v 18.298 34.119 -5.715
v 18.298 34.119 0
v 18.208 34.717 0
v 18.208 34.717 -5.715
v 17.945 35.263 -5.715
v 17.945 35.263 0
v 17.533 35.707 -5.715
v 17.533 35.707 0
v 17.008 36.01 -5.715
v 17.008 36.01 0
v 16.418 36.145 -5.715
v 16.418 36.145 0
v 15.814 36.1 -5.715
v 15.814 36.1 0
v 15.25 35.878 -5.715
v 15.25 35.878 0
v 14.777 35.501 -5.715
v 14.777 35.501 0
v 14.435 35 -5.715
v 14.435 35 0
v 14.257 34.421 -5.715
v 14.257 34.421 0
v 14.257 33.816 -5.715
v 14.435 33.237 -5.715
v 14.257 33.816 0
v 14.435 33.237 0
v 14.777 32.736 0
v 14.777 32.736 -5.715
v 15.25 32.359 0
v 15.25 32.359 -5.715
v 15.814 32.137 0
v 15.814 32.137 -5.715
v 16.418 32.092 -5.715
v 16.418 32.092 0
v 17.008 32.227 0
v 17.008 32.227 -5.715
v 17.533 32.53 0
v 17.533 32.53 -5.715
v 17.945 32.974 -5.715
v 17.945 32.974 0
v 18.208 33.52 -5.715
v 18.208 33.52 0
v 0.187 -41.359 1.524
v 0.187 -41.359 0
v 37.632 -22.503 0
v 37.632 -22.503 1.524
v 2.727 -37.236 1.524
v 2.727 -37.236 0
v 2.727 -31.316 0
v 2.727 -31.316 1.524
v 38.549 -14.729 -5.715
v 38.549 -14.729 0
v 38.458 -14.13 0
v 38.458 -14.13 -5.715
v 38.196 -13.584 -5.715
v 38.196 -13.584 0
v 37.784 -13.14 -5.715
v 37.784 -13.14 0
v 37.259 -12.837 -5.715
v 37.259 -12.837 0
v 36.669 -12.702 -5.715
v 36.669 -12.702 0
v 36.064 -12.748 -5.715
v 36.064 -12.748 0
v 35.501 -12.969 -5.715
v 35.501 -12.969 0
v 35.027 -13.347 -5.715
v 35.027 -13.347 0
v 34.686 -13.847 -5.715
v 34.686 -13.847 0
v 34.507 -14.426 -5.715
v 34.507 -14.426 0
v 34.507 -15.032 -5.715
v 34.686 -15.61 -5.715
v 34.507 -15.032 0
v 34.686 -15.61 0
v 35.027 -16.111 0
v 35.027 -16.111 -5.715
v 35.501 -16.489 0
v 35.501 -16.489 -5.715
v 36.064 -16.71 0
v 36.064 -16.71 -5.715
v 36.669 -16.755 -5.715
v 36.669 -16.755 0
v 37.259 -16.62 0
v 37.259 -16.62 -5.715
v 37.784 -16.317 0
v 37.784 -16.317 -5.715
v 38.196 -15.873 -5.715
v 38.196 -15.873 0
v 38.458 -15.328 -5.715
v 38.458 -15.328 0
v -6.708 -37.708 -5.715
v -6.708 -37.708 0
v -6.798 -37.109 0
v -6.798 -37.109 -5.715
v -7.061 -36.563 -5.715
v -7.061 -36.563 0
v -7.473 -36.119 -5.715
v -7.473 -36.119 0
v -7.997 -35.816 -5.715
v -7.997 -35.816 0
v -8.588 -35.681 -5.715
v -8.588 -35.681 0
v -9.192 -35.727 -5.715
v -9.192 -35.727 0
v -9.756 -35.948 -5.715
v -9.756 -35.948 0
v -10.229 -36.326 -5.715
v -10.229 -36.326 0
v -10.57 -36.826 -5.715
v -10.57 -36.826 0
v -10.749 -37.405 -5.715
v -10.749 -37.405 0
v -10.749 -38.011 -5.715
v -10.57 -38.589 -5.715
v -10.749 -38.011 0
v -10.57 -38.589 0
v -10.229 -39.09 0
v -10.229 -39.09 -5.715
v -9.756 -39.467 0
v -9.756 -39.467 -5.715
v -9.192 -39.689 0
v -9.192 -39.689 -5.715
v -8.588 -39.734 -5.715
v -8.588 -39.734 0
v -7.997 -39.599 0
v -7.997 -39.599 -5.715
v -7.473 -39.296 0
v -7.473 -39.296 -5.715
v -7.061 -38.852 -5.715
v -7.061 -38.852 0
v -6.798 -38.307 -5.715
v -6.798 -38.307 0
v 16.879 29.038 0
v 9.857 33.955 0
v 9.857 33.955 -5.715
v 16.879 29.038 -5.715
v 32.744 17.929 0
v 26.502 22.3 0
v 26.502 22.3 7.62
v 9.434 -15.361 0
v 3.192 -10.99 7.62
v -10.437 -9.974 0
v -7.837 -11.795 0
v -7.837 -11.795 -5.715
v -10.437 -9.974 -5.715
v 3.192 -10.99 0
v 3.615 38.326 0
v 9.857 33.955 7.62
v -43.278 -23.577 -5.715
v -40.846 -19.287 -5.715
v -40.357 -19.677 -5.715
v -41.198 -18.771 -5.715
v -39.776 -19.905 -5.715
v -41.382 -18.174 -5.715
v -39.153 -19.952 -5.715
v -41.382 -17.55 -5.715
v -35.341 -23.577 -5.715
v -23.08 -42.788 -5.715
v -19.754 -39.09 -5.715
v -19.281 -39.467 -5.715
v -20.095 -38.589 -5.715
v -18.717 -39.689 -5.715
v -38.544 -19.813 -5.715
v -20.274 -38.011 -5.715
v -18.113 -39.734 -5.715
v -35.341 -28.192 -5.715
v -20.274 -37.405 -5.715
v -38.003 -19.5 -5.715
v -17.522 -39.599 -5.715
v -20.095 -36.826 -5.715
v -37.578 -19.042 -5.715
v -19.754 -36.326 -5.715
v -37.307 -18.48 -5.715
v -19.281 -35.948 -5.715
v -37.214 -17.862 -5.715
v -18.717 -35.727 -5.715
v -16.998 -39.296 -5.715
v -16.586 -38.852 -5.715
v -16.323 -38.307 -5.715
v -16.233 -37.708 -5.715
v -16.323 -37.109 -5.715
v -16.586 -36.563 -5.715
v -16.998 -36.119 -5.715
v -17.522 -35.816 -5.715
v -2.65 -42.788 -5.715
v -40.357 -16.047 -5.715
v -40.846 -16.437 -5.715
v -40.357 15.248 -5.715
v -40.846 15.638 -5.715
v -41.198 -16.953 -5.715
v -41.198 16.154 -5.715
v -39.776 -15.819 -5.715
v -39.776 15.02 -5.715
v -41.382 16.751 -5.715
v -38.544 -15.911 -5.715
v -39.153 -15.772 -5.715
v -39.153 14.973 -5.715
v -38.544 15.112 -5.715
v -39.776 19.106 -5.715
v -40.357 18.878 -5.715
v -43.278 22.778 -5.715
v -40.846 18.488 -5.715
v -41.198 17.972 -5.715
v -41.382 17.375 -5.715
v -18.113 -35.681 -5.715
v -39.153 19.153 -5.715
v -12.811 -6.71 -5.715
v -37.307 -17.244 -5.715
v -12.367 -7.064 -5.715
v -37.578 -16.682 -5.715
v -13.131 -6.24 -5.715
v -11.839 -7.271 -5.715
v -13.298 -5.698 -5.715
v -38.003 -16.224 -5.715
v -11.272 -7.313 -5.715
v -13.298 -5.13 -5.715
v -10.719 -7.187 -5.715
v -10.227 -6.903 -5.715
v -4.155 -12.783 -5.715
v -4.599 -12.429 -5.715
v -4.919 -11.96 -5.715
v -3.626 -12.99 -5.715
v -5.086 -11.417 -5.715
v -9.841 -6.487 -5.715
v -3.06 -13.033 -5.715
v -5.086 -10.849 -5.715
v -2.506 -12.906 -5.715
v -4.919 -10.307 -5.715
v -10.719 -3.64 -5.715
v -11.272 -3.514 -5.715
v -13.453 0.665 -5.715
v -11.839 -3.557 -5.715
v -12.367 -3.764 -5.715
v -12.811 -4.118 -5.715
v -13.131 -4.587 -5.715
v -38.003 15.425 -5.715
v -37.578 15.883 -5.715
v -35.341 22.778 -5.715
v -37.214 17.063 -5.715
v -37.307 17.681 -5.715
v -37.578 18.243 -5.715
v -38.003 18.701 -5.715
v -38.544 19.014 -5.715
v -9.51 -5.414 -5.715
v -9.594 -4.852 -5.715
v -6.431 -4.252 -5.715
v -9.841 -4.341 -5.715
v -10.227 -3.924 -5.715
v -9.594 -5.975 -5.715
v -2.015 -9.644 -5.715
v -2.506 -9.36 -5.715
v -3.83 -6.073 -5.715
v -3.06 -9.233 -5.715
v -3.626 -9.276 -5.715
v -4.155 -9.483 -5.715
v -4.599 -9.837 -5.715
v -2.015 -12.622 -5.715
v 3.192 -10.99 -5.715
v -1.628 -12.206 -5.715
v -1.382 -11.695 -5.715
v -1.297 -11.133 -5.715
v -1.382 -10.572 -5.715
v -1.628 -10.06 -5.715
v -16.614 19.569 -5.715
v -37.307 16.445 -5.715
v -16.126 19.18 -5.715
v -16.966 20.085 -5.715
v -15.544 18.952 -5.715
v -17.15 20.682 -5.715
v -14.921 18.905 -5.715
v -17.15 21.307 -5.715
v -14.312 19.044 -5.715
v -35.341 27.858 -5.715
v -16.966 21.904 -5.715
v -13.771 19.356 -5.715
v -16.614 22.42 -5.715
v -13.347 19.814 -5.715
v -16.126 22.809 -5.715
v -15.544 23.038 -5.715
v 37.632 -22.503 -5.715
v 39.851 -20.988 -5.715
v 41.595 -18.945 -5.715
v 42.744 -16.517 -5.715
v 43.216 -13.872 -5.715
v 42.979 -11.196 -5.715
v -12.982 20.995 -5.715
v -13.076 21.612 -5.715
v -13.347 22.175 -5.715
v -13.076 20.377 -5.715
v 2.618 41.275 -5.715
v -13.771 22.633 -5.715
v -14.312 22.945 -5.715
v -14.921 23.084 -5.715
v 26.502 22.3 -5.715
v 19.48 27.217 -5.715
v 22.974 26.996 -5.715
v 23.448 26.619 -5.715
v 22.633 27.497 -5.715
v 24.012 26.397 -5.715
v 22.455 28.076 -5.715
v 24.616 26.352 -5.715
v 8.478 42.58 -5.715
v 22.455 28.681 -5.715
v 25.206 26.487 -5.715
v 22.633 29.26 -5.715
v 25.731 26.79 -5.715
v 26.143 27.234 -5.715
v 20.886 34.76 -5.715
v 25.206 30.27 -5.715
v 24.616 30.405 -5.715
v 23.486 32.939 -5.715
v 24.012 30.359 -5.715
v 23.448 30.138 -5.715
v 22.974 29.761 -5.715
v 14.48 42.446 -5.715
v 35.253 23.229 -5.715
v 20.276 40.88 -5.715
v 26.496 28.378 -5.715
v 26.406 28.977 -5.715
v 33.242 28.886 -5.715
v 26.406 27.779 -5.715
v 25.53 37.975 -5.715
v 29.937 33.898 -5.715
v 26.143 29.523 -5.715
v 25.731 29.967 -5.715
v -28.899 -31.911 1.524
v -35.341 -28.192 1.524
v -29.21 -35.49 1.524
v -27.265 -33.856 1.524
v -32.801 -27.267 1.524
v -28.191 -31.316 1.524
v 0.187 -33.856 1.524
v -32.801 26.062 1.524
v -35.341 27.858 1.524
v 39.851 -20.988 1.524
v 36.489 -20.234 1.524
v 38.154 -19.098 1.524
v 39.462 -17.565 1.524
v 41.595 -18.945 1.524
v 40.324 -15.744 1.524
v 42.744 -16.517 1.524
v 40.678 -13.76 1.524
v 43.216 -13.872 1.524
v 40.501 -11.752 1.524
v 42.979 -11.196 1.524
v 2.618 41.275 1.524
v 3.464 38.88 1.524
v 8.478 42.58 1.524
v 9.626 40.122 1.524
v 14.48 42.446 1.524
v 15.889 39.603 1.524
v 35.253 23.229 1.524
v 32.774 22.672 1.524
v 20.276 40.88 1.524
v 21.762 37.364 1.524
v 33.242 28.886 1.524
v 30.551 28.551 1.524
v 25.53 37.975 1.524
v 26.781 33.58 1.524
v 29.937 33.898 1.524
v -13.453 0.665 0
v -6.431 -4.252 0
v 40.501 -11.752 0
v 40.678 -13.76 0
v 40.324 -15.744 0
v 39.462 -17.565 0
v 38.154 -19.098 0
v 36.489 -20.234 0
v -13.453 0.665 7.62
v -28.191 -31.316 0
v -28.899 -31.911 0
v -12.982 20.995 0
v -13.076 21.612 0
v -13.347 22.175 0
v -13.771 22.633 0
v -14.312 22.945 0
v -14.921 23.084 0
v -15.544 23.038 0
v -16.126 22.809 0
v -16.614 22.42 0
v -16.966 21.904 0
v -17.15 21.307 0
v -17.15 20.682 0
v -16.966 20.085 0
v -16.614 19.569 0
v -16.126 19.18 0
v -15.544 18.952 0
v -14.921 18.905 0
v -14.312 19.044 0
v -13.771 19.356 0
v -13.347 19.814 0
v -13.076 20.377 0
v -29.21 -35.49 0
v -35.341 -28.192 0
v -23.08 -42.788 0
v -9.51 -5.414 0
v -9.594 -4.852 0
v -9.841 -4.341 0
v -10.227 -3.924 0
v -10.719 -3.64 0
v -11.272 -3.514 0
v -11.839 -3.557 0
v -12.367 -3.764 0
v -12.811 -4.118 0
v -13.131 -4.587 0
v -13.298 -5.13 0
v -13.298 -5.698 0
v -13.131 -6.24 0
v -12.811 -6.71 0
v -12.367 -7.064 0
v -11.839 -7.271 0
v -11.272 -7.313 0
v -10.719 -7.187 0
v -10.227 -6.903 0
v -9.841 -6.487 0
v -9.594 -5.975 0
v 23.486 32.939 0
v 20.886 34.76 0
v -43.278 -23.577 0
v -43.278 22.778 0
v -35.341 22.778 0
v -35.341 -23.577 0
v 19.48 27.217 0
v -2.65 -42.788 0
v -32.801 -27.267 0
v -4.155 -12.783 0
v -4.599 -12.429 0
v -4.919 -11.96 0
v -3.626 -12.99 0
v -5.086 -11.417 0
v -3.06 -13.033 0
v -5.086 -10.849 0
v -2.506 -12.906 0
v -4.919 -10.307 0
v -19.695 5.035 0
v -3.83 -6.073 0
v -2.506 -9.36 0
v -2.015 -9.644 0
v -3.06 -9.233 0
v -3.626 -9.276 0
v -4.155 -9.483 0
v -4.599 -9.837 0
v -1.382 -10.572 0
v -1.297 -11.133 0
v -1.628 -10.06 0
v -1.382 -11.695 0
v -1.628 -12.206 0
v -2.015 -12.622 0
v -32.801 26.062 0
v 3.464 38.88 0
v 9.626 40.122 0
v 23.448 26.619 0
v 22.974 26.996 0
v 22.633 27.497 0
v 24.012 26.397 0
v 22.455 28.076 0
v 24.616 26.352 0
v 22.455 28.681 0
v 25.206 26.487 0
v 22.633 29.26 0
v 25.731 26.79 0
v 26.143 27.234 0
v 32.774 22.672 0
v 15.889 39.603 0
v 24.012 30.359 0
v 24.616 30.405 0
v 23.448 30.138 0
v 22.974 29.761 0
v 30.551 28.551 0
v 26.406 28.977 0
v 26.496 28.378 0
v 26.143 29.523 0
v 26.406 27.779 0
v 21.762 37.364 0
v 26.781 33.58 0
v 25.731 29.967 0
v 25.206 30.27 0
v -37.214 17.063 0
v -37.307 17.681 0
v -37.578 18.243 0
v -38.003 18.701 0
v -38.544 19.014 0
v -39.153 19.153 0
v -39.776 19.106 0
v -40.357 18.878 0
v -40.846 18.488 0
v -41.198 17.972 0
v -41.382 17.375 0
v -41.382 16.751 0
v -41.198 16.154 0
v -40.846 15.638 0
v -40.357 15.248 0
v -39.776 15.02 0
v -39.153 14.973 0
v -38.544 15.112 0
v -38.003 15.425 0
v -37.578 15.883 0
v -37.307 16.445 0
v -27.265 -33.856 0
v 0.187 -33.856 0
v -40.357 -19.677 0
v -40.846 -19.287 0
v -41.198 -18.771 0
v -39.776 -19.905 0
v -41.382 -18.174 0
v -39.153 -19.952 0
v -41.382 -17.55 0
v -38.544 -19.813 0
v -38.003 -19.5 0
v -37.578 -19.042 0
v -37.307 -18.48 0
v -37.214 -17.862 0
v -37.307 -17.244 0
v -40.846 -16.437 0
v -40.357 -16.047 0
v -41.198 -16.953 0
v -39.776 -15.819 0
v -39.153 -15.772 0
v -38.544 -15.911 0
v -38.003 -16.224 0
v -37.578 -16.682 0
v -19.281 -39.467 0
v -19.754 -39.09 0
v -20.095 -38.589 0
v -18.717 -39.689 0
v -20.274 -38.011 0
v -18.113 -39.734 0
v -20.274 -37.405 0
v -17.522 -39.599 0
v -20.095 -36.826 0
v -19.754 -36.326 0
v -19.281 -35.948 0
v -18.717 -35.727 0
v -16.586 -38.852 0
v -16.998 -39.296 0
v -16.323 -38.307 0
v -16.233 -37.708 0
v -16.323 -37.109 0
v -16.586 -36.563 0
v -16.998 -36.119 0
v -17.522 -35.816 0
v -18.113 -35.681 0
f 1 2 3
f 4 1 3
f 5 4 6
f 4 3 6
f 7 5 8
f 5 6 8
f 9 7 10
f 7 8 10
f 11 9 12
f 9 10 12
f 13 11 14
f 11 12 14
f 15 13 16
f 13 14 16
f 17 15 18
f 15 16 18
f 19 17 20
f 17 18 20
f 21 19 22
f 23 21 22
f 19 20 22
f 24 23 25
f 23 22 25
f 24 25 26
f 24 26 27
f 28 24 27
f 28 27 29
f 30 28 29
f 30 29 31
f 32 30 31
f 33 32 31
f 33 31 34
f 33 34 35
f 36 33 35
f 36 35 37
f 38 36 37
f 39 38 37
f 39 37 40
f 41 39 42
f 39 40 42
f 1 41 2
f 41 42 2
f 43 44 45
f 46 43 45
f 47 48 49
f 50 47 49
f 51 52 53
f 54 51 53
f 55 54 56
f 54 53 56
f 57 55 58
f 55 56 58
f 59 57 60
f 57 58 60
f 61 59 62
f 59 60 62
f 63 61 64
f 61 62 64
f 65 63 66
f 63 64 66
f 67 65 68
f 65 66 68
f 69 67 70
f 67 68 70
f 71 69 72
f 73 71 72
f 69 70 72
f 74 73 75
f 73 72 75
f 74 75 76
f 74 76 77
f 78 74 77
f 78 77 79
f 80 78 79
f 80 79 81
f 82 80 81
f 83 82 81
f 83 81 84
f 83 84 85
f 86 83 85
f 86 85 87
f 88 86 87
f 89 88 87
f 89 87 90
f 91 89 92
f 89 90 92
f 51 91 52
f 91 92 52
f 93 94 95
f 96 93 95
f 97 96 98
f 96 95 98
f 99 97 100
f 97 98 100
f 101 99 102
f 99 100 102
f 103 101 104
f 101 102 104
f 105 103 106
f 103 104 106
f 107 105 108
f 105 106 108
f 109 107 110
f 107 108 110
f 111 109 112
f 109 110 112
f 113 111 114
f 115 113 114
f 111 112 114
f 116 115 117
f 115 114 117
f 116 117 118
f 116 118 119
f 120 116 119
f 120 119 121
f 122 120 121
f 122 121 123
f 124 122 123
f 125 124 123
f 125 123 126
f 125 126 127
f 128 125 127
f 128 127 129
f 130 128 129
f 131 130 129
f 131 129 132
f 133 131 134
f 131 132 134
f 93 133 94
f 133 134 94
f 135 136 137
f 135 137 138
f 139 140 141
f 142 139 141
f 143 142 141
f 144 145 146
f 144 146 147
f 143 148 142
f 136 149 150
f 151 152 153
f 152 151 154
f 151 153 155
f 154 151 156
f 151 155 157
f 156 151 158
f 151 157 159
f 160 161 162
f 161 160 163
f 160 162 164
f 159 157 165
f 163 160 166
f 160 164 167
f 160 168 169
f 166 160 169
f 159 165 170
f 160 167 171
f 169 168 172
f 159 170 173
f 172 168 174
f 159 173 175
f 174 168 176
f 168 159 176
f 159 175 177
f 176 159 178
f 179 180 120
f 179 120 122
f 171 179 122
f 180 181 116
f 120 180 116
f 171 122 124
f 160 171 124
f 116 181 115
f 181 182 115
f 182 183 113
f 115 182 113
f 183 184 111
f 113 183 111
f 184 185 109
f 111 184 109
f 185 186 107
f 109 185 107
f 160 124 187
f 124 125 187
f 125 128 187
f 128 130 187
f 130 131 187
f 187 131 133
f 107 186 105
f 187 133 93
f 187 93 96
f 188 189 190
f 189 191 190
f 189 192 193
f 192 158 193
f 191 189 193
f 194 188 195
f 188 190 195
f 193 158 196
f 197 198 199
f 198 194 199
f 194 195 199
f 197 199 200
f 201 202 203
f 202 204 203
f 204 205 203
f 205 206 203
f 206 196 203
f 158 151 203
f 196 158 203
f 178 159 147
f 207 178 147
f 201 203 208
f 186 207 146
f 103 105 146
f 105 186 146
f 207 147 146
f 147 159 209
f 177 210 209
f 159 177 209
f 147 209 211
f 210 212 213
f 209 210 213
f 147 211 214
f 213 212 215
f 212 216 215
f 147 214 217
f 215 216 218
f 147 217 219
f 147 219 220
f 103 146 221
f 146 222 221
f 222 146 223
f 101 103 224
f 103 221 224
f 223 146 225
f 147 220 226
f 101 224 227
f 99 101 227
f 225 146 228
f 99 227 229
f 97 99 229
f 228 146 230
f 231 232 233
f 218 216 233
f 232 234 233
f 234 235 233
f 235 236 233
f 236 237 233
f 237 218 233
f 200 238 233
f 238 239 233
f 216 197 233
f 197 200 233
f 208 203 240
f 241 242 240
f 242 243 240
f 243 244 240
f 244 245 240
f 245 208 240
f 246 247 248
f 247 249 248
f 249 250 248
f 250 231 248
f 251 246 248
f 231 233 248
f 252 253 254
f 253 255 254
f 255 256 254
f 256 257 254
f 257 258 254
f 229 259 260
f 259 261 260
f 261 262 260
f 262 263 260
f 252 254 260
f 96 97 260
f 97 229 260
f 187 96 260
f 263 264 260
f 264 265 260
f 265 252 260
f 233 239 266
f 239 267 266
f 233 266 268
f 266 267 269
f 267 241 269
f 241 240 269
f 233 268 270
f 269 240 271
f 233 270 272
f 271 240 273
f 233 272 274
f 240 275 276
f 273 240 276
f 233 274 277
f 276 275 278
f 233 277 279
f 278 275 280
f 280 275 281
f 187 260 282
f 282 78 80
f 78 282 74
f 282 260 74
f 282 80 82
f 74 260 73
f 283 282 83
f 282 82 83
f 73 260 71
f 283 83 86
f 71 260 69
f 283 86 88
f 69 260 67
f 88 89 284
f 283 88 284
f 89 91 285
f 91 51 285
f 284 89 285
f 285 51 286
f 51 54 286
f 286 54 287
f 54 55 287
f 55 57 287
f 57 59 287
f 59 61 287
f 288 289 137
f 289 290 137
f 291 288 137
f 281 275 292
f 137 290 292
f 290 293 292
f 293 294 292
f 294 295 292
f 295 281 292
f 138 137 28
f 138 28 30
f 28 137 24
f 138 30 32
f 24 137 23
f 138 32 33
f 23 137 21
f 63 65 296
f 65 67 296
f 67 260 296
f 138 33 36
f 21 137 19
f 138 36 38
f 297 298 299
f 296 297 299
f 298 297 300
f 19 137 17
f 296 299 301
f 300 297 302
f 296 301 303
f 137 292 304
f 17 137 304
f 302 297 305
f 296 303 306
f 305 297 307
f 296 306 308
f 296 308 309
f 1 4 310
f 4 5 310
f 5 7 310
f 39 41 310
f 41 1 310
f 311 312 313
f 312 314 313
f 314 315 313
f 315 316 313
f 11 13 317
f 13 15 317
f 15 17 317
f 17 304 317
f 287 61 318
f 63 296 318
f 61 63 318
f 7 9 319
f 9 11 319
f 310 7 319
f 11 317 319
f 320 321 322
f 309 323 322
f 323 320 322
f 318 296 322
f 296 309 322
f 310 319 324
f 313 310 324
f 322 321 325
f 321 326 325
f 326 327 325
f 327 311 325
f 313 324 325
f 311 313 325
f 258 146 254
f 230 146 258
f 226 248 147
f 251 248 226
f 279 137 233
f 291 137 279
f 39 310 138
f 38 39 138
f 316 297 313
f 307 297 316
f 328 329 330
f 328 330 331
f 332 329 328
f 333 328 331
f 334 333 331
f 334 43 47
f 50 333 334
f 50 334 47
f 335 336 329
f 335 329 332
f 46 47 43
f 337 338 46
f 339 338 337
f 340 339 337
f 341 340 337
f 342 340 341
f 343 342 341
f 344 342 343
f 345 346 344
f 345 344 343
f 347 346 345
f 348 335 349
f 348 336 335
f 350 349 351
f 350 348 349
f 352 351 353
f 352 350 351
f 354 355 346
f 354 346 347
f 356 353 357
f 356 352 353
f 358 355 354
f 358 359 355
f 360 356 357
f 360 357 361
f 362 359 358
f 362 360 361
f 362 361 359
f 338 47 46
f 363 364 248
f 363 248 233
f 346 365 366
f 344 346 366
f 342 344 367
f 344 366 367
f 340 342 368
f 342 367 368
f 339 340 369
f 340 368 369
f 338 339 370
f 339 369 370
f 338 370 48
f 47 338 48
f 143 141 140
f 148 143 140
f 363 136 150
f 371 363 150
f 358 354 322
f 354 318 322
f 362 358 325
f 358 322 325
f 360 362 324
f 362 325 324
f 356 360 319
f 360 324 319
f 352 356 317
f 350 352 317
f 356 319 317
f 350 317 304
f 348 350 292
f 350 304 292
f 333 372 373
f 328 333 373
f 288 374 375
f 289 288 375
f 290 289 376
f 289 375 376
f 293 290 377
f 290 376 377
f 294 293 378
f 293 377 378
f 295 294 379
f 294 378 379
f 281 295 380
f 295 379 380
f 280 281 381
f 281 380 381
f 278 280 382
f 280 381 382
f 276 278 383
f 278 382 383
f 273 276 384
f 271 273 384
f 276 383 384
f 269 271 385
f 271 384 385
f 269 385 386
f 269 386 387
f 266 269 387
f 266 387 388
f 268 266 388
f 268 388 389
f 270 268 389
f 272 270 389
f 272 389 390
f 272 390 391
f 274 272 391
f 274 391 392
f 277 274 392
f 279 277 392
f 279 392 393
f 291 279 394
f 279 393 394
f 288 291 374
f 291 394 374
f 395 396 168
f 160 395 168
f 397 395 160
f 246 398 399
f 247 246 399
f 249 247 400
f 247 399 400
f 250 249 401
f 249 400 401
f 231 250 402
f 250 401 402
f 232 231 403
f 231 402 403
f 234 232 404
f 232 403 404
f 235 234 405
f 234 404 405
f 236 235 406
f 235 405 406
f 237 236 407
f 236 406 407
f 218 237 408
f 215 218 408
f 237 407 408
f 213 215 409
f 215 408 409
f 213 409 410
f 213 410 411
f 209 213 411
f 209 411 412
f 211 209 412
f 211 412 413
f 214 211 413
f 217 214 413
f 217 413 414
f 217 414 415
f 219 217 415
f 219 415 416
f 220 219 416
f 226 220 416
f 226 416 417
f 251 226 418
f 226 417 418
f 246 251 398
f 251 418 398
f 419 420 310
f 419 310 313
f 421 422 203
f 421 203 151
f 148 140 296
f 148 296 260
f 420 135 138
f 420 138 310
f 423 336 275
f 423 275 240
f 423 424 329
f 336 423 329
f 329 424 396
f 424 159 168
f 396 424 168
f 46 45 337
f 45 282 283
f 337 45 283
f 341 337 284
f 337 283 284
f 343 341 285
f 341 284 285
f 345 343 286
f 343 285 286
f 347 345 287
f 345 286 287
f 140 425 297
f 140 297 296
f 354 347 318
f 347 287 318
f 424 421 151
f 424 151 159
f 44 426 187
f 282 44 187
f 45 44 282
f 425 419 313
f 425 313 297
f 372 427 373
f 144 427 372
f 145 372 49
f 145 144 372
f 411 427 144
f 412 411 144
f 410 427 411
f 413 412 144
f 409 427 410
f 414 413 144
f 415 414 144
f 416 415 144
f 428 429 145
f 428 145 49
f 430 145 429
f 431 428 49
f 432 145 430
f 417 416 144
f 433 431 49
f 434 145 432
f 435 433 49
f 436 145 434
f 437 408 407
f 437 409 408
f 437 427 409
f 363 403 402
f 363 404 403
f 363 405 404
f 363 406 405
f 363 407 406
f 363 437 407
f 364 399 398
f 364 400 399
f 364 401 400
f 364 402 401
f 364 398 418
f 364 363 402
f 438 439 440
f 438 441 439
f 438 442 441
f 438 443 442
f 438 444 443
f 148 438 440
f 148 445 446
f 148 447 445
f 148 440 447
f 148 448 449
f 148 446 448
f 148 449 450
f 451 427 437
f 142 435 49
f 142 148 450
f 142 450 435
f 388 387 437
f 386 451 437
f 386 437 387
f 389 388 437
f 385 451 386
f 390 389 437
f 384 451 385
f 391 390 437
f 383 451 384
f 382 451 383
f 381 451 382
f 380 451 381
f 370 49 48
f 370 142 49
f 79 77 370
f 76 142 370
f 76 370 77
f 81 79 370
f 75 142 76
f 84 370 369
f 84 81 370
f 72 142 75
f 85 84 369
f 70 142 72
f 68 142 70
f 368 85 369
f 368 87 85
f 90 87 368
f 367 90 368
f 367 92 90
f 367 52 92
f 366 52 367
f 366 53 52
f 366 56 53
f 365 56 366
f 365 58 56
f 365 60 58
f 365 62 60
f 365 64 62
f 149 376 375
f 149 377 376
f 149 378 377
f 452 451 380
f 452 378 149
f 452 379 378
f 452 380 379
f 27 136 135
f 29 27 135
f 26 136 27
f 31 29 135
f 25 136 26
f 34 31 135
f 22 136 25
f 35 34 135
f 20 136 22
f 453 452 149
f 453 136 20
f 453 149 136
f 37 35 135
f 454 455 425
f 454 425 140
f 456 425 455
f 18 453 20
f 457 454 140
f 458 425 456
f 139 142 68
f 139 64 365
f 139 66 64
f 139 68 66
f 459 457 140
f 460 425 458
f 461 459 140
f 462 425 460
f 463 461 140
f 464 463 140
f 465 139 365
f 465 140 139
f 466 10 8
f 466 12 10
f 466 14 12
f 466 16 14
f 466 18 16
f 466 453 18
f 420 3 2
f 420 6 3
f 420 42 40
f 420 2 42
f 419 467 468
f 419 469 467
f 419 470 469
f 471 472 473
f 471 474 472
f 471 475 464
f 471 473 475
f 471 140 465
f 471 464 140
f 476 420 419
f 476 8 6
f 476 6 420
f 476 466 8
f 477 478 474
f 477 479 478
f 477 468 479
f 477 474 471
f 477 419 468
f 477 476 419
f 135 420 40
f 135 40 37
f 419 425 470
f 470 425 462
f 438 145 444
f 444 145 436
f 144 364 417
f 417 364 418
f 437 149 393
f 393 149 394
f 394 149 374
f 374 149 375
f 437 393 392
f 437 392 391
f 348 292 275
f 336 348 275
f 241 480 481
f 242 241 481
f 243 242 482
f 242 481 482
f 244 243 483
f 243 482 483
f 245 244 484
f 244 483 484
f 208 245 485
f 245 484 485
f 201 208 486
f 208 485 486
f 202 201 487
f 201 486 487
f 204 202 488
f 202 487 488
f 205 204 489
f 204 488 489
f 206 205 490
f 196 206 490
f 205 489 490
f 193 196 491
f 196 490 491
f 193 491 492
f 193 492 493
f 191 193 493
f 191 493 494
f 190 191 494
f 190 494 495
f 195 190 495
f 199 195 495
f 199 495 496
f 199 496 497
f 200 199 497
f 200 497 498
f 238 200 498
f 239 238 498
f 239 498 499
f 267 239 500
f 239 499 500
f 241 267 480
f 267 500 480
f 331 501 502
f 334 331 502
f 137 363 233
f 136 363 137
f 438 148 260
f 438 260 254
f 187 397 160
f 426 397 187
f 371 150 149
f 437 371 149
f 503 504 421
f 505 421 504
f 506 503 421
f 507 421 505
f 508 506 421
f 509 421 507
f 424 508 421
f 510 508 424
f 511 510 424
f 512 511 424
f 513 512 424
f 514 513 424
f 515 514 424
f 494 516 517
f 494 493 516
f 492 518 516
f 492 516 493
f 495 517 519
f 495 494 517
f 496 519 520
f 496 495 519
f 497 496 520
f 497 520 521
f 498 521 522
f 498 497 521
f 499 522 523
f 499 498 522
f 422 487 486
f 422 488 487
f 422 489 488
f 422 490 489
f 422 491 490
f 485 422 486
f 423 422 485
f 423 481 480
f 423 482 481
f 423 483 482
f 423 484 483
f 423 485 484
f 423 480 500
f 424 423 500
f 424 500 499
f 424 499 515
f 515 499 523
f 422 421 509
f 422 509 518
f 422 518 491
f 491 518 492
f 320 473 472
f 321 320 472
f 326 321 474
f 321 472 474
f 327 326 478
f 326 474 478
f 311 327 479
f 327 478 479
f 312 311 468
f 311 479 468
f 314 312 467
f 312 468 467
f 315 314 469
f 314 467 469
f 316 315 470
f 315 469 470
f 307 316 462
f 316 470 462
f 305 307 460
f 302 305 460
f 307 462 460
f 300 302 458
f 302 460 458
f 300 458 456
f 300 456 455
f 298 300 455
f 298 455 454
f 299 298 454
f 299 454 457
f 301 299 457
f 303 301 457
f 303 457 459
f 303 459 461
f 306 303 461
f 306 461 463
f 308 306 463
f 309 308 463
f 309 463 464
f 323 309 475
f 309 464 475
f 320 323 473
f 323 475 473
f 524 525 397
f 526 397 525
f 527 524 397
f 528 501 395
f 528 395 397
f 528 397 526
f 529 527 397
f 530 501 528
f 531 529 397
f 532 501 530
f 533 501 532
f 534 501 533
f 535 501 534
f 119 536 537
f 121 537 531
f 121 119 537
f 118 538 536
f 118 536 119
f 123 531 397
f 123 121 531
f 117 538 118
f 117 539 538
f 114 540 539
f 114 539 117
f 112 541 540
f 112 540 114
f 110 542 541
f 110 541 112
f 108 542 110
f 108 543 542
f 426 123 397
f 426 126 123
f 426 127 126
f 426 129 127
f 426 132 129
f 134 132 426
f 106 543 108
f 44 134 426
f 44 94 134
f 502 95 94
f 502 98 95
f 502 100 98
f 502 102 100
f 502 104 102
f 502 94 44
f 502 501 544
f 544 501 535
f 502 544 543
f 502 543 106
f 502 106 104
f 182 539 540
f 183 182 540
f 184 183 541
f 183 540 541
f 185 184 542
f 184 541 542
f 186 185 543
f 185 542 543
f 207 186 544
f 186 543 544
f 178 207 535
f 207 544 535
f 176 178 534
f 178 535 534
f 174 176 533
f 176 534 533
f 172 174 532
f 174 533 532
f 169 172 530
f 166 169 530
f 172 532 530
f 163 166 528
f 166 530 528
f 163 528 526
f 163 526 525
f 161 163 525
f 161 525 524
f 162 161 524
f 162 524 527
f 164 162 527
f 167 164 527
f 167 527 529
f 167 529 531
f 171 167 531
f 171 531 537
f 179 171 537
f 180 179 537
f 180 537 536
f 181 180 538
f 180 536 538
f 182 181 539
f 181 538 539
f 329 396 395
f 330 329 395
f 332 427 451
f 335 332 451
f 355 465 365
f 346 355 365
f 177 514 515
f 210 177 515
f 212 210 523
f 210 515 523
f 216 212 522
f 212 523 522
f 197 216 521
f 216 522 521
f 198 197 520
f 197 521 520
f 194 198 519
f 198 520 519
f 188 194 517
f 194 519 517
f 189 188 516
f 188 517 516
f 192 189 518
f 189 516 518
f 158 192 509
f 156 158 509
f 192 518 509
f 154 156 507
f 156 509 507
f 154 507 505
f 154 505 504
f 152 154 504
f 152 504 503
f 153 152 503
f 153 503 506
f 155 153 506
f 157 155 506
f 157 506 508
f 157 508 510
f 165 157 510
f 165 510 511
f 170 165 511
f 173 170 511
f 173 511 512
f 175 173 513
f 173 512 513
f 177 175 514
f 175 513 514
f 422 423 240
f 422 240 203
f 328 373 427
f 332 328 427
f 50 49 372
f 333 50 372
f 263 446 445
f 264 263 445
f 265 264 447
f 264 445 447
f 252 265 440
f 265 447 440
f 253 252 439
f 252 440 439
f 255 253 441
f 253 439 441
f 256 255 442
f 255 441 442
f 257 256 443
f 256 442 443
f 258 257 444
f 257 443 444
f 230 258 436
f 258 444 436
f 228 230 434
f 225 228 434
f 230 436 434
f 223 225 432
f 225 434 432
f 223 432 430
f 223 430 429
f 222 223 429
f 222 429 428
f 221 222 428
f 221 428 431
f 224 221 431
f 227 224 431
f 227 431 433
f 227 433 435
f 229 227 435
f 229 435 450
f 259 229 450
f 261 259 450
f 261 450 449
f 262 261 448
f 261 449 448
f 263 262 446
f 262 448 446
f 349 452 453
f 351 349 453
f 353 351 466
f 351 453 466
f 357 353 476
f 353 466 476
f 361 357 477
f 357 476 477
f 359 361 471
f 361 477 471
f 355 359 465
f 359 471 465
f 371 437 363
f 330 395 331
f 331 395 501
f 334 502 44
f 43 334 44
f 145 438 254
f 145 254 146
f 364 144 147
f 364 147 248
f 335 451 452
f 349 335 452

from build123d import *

# Parameters (mm, degrees)
F0_R     = 2.032
F0_R_2   = 2.0955
F0_R_3   = 1.905
F1_DEPTH = 5.715
F3_DEPTH = 1.524
F5_DEPTH = 1.524
F7_DEPTH = 40.64


with BuildPart() as f1:
    # F0 (on Top) → F1 (new body)
    with BuildSketch(Plane.XY):
        with BuildLine():
            Line((42.979039, -11.196153), (35.252589, 23.228599))
            ThreePointArc((35.252589, 23.228599), (22.99115, 39.586517), (2.617796, 41.274961))
            Line((2.617796, 41.274961), (-35.34082, 27.858045))
            Line((-35.34082, 27.858045), (-35.34082, 22.778045))
            Line((-35.34082, 22.778045), (-43.27832, 22.778045))
            Line((-43.27832, 22.778045), (-43.27832, -23.576955))
            Line((-43.27832, -23.576955), (-35.34082, -23.576955))
            Line((-35.34082, -23.576955), (-35.34082, -28.192097))
            Line((-35.34082, -28.192097), (-23.079528, -42.787694))
            Line((-23.079528, -42.787694), (-2.65018, -42.787694))
            Line((-2.65018, -42.787694), (37.631817, -22.502827))
            ThreePointArc((37.631817, -22.502827), (42.249864, -17.769064), (42.979039, -11.196153))
        make_face()
        with Locations((-18.264627, -37.707694)):
            Circle(F0_R, mode=Mode.SUBTRACT)
        with Locations((-8.739627, -37.707694)):
            Circle(F0_R, mode=Mode.SUBTRACT)
        with Locations((-39.30957, -17.861955)):
            Circle(F0_R_2, mode=Mode.SUBTRACT)
        with Locations((-3.20238, -11.133077)):
            Circle(F0_R_3, mode=Mode.SUBTRACT)
        with Locations((-11.414669, -5.413778)):
            Circle(F0_R_3, mode=Mode.SUBTRACT)
        with Locations((36.516652, -14.728804)):
            Circle(F0_R, mode=Mode.SUBTRACT)
        with Locations((-39.30957, 17.063045)):
            Circle(F0_R_2, mode=Mode.SUBTRACT)
        with Locations((-15.07797, 20.994581)):
            Circle(F0_R_2, mode=Mode.SUBTRACT)
        Polygon((26.502235, 22.29995), (3.192089, -10.990389), (-3.830092, -6.073405), (-7.836523, -11.795182), (-10.437331, -9.974077), (-6.4309, -4.2523), (-13.453081, 0.664684), (9.857066, 33.955024), (16.879247, 29.03804), (20.885678, 34.759817), (23.486486, 32.938711), (19.480055, 27.216934), align=None, mode=Mode.SUBTRACT)
        with Locations((16.266104, 34.118518)):
            Circle(F0_R, mode=Mode.SUBTRACT)
        with Locations((24.46385, 28.378394)):
            Circle(F0_R, mode=Mode.SUBTRACT)
    extrude(amount=-F1_DEPTH)

    # F2 (on face) → F3 (join)
    with BuildSketch(Plane.XY):
        with BuildLine():
            Line((-35.34082, 22.778045), (-35.34082, -23.576955))
            Line((-35.34082, -23.576955), (-35.34082, -28.192097))
            Line((-35.34082, -28.192097), (-29.210174, -35.489896))
            Line((-29.210174, -35.489896), (-27.265349, -33.85611))
            Line((-27.265349, -33.85611), (-32.80082, -27.266796))
            Line((-32.80082, -27.266796), (-32.80082, -23.576955))
            Line((-32.80082, -23.576955), (-32.80082, 22.778045))
            Line((-32.80082, 22.778045), (-32.80082, 26.061838))
            Line((-32.80082, 26.061838), (3.464267, 38.880157))
            ThreePointArc((3.464267, 38.880157), (21.761995, 37.363731), (32.774246, 22.672349))
            Line((32.774246, 22.672349), (40.500696, -11.752404))
            ThreePointArc((40.500696, -11.752404), (39.953697, -16.683147), (36.489417, -20.234232))
            Line((36.489417, -20.234232), (0.186785, -38.515204))
            Line((0.186785, -38.515204), (0.186785, -41.359079))
            Line((0.186785, -41.359079), (37.631817, -22.502827))
            ThreePointArc((37.631817, -22.502827), (42.249864, -17.769064), (42.979039, -11.196153))
            Line((42.979039, -11.196153), (35.252589, 23.228599))
            ThreePointArc((35.252589, 23.228599), (22.99115, 39.586517), (2.617796, 41.274961))
            Line((2.617796, 41.274961), (-35.34082, 27.858045))
            Line((-35.34082, 27.858045), (-35.34082, 22.778045))
        make_face()
    extrude(amount=F3_DEPTH)

    # F4 (on face) → F5 (join)
    with BuildSketch(Plane.XY):
        Polygon((-28.899134, -31.911285), (-27.265349, -33.85611), (0.186785, -33.85611), (0.186785, -38.515204), (2.726785, -37.236132), (2.726785, -31.31611), (-28.19065, -31.31611), align=None)
    extrude(amount=F5_DEPTH)

    # F6 (on face) → F7 (join)
    with BuildSketch(Plane(origin=(19.196518, 27.415469, 0), x_dir=(0.819152, -0.573576, 0), z_dir=(-0.573576, -0.819152, 0))):
        Polygon((-19.021366, 0), (-11.401366, 0), (-11.401366, 7.62), align=None)
        Polygon((8.918634, 7.62), (8.918634, 0), (16.538634, 0), align=None)
    extrude(amount=F7_DEPTH)


solid = f1.part
